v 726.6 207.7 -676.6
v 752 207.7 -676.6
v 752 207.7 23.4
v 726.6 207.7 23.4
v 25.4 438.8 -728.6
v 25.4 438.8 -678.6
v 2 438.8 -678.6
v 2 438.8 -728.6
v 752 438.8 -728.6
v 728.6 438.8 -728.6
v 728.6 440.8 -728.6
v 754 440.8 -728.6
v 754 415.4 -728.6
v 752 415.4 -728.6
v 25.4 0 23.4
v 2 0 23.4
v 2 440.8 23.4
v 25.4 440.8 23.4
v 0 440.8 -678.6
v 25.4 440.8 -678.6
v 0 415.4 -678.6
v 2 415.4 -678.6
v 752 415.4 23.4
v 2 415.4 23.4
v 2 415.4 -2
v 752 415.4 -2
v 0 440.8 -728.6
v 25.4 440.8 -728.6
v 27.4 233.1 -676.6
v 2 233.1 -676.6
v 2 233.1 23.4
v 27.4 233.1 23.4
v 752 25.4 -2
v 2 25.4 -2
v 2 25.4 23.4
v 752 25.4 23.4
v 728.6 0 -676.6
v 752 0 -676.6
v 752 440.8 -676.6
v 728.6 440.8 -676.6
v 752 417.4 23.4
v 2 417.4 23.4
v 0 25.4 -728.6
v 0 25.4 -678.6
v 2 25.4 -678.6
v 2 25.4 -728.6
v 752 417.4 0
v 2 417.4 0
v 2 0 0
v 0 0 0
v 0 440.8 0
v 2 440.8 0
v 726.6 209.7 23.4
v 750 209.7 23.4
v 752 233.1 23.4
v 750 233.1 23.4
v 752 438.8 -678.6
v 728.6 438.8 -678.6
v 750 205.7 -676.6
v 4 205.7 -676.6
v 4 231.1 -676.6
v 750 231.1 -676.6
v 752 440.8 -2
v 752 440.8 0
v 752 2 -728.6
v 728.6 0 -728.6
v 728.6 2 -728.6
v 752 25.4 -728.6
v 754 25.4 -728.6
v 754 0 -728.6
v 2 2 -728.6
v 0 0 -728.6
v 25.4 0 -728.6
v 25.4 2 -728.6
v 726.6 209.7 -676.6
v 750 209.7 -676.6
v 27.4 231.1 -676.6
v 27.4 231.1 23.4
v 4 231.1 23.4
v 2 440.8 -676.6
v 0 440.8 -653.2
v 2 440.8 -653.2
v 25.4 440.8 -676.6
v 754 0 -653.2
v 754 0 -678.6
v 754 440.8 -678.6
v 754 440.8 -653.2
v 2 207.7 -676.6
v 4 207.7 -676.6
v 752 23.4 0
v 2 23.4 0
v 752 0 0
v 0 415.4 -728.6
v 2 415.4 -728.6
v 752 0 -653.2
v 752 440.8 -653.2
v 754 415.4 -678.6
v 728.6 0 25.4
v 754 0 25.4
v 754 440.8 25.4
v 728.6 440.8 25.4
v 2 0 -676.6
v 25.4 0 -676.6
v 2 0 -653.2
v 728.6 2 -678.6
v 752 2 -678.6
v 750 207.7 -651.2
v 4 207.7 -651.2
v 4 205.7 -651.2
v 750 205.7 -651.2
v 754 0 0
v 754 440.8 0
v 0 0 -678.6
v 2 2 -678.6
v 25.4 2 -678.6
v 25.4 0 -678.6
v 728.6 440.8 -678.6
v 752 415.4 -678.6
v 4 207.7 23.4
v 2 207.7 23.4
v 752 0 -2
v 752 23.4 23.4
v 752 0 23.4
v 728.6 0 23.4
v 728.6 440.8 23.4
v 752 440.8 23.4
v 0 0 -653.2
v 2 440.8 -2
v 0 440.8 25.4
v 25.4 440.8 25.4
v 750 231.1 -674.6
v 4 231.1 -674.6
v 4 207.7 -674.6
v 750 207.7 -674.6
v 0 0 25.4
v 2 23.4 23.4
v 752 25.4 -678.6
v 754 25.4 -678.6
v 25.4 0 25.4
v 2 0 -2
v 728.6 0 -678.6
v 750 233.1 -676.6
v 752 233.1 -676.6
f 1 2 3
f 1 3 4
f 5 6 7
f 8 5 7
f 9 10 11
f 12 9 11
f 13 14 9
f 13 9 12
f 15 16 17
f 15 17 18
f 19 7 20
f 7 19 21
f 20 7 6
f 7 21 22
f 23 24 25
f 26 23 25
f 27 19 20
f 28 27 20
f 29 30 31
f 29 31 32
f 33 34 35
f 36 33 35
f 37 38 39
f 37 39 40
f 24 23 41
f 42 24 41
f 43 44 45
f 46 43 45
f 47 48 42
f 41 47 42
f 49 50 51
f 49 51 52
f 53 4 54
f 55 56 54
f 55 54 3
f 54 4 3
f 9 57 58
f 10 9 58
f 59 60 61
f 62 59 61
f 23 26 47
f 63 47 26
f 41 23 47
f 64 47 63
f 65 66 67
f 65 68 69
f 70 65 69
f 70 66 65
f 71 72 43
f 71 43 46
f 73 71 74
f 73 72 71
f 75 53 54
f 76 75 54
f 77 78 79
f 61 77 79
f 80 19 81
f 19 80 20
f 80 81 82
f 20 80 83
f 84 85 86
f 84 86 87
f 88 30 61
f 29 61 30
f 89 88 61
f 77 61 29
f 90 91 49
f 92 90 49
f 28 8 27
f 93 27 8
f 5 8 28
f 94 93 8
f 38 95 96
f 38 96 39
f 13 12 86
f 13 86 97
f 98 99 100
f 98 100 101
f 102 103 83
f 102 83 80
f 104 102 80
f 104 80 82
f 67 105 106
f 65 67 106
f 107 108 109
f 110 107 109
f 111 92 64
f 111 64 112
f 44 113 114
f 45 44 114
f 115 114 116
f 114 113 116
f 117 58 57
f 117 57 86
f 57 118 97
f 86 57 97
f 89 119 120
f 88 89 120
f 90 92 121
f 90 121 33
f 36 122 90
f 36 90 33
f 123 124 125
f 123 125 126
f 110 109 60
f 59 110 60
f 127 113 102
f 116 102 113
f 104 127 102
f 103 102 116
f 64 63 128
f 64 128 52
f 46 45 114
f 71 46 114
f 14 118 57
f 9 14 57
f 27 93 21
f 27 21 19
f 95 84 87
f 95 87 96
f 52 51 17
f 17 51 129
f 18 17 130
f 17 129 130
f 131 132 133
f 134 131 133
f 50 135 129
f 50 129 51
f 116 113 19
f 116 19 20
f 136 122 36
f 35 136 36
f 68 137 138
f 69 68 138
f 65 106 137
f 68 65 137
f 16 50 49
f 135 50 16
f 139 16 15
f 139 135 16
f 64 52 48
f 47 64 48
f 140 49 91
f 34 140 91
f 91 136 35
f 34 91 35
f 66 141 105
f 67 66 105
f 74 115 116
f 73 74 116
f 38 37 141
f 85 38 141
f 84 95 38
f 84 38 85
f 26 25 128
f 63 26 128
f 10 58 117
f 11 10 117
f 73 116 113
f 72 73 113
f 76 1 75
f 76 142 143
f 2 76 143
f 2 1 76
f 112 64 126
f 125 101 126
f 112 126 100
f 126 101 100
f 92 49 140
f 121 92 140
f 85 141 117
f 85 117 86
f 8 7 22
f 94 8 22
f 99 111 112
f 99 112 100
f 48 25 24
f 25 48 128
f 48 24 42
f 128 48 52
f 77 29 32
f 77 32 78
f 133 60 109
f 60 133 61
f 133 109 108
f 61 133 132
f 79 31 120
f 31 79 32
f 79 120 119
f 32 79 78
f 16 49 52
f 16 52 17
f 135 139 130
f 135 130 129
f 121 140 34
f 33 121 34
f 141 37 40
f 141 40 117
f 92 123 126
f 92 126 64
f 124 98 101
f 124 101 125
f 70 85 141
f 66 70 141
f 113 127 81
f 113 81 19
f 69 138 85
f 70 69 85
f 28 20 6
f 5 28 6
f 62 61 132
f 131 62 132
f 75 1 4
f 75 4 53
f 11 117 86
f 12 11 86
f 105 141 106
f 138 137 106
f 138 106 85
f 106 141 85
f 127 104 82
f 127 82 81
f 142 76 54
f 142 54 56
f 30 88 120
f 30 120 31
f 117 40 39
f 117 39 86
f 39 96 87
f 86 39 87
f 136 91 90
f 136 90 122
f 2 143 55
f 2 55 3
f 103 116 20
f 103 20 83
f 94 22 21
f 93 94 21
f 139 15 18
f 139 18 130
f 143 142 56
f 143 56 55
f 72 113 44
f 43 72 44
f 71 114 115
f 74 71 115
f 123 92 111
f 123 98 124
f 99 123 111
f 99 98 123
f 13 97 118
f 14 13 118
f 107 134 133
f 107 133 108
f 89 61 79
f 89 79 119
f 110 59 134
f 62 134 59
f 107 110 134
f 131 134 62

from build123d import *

# Parameters (mm, degrees)
F1_DEPTH  = 440.8
F2_W      = 2
F2_H      = 23.4
F3_DEPTH  = 750
F5_DEPTH  = 440.8
F7_DEPTH  = 700
F9_DEPTH  = 440.8
F11_DEPTH = 50
F13_DEPTH = 746


with BuildPart() as f1:
    # F0 (on Front) → F1 (new body)
    with BuildSketch(Plane.XZ):
        Polygon((0, 25.4), (0, 0), (2, 0), (2, 23.4), (25.4, 23.4), (25.4, 25.4), align=None)
    extrude(amount=-F1_DEPTH)


with BuildPart() as f3:
    # F2 (on face) → F3 (new body)
    with BuildSketch(Plane.YZ.offset(2)):
        with Locations((24.4, 11.7)):
            Rectangle(F2_W, F2_H)
        Polygon((25.4, -2), (25.4, 0), (23.4, 0), (0, 0), (0, -2), align=None)
        with Locations((416.4, 11.7)):
            Rectangle(F2_W, F2_H)
        Polygon((417.4, 0), (415.4, 0), (415.4, -2), (440.8, -2), (440.8, 0), align=None)
    extrude(amount=F3_DEPTH)


with BuildPart() as f5:
    # F4 (on Front) → F5 (new body)
    with BuildSketch(Plane.XZ):
        Polygon((752, 0), (754, 0), (754, 25.4), (728.6, 25.4), (728.6, 23.4), (752, 23.4), align=None)
    extrude(amount=-F5_DEPTH)


with BuildPart() as f7:
    # F6 (on face) → F7 (new body)
    with BuildSketch(Plane(origin=(0, 0, 23.4), x_dir=(1, 0, 0), z_dir=(0, 0, -1))):
        Polygon((2, -207.7), (2, -220.4), (2, -233.1), (27.4, -233.1), (27.4, -231.1), (4, -231.1), (4, -207.7), align=None)
        Polygon((752, -233.1), (752, -220.4), (752, -207.7), (726.6, -207.7), (726.6, -209.7), (750, -209.7), (750, -233.1), align=None)
    extrude(amount=F7_DEPTH)


with BuildPart() as f9:
    # F8 (on Front) → F9 (new body)
    with BuildSketch(Plane.XZ):
        Polygon((25.4, -678.6), (25.4, -676.6), (2, -676.6), (2, -653.2), (0, -653.2), (0, -678.6), align=None)
        Polygon((752, -676.6), (728.6, -676.6), (728.6, -678.6), (754, -678.6), (754, -653.2), (752, -653.2), align=None)
    extrude(amount=-F9_DEPTH)


with BuildPart() as f11:
    # F10 (on face) → F11 (new body)
    with BuildSketch(Plane(origin=(0, 0, -678.6), x_dir=(1, 0, 0), z_dir=(0, 0, -1))):
        Polygon((25.4, 0), (0, 0), (0, -25.4), (2, -25.4), (2, -2), (25.4, -2), align=None)
        Polygon((0, -415.4), (0, -440.8), (25.4, -440.8), (25.4, -438.8), (2, -438.8), (2, -415.4), align=None)
        Polygon((728.6, 0), (728.6, -2), (752, -2), (752, -25.4), (754, -25.4), (754, 0), align=None)
        Polygon((752, -438.8), (728.6, -438.8), (728.6, -440.8), (754, -440.8), (754, -415.4), (752, -415.4), align=None)
    extrude(amount=F11_DEPTH)


with BuildPart() as f13:
    # F12 (on face) → F13 (new body, through all)
    with BuildSketch(Plane.YZ.offset(4)):
        Polygon((205.7, -676.6), (231.1, -676.6), (231.1, -674.6), (207.7, -674.6), (207.7, -651.2), (205.7, -651.2), align=None)
    extrude(amount=F13_DEPTH)


solid = Compound([f1.part, f3.part, f5.part, f7.part, f9.part, f11.part, f13.part])
